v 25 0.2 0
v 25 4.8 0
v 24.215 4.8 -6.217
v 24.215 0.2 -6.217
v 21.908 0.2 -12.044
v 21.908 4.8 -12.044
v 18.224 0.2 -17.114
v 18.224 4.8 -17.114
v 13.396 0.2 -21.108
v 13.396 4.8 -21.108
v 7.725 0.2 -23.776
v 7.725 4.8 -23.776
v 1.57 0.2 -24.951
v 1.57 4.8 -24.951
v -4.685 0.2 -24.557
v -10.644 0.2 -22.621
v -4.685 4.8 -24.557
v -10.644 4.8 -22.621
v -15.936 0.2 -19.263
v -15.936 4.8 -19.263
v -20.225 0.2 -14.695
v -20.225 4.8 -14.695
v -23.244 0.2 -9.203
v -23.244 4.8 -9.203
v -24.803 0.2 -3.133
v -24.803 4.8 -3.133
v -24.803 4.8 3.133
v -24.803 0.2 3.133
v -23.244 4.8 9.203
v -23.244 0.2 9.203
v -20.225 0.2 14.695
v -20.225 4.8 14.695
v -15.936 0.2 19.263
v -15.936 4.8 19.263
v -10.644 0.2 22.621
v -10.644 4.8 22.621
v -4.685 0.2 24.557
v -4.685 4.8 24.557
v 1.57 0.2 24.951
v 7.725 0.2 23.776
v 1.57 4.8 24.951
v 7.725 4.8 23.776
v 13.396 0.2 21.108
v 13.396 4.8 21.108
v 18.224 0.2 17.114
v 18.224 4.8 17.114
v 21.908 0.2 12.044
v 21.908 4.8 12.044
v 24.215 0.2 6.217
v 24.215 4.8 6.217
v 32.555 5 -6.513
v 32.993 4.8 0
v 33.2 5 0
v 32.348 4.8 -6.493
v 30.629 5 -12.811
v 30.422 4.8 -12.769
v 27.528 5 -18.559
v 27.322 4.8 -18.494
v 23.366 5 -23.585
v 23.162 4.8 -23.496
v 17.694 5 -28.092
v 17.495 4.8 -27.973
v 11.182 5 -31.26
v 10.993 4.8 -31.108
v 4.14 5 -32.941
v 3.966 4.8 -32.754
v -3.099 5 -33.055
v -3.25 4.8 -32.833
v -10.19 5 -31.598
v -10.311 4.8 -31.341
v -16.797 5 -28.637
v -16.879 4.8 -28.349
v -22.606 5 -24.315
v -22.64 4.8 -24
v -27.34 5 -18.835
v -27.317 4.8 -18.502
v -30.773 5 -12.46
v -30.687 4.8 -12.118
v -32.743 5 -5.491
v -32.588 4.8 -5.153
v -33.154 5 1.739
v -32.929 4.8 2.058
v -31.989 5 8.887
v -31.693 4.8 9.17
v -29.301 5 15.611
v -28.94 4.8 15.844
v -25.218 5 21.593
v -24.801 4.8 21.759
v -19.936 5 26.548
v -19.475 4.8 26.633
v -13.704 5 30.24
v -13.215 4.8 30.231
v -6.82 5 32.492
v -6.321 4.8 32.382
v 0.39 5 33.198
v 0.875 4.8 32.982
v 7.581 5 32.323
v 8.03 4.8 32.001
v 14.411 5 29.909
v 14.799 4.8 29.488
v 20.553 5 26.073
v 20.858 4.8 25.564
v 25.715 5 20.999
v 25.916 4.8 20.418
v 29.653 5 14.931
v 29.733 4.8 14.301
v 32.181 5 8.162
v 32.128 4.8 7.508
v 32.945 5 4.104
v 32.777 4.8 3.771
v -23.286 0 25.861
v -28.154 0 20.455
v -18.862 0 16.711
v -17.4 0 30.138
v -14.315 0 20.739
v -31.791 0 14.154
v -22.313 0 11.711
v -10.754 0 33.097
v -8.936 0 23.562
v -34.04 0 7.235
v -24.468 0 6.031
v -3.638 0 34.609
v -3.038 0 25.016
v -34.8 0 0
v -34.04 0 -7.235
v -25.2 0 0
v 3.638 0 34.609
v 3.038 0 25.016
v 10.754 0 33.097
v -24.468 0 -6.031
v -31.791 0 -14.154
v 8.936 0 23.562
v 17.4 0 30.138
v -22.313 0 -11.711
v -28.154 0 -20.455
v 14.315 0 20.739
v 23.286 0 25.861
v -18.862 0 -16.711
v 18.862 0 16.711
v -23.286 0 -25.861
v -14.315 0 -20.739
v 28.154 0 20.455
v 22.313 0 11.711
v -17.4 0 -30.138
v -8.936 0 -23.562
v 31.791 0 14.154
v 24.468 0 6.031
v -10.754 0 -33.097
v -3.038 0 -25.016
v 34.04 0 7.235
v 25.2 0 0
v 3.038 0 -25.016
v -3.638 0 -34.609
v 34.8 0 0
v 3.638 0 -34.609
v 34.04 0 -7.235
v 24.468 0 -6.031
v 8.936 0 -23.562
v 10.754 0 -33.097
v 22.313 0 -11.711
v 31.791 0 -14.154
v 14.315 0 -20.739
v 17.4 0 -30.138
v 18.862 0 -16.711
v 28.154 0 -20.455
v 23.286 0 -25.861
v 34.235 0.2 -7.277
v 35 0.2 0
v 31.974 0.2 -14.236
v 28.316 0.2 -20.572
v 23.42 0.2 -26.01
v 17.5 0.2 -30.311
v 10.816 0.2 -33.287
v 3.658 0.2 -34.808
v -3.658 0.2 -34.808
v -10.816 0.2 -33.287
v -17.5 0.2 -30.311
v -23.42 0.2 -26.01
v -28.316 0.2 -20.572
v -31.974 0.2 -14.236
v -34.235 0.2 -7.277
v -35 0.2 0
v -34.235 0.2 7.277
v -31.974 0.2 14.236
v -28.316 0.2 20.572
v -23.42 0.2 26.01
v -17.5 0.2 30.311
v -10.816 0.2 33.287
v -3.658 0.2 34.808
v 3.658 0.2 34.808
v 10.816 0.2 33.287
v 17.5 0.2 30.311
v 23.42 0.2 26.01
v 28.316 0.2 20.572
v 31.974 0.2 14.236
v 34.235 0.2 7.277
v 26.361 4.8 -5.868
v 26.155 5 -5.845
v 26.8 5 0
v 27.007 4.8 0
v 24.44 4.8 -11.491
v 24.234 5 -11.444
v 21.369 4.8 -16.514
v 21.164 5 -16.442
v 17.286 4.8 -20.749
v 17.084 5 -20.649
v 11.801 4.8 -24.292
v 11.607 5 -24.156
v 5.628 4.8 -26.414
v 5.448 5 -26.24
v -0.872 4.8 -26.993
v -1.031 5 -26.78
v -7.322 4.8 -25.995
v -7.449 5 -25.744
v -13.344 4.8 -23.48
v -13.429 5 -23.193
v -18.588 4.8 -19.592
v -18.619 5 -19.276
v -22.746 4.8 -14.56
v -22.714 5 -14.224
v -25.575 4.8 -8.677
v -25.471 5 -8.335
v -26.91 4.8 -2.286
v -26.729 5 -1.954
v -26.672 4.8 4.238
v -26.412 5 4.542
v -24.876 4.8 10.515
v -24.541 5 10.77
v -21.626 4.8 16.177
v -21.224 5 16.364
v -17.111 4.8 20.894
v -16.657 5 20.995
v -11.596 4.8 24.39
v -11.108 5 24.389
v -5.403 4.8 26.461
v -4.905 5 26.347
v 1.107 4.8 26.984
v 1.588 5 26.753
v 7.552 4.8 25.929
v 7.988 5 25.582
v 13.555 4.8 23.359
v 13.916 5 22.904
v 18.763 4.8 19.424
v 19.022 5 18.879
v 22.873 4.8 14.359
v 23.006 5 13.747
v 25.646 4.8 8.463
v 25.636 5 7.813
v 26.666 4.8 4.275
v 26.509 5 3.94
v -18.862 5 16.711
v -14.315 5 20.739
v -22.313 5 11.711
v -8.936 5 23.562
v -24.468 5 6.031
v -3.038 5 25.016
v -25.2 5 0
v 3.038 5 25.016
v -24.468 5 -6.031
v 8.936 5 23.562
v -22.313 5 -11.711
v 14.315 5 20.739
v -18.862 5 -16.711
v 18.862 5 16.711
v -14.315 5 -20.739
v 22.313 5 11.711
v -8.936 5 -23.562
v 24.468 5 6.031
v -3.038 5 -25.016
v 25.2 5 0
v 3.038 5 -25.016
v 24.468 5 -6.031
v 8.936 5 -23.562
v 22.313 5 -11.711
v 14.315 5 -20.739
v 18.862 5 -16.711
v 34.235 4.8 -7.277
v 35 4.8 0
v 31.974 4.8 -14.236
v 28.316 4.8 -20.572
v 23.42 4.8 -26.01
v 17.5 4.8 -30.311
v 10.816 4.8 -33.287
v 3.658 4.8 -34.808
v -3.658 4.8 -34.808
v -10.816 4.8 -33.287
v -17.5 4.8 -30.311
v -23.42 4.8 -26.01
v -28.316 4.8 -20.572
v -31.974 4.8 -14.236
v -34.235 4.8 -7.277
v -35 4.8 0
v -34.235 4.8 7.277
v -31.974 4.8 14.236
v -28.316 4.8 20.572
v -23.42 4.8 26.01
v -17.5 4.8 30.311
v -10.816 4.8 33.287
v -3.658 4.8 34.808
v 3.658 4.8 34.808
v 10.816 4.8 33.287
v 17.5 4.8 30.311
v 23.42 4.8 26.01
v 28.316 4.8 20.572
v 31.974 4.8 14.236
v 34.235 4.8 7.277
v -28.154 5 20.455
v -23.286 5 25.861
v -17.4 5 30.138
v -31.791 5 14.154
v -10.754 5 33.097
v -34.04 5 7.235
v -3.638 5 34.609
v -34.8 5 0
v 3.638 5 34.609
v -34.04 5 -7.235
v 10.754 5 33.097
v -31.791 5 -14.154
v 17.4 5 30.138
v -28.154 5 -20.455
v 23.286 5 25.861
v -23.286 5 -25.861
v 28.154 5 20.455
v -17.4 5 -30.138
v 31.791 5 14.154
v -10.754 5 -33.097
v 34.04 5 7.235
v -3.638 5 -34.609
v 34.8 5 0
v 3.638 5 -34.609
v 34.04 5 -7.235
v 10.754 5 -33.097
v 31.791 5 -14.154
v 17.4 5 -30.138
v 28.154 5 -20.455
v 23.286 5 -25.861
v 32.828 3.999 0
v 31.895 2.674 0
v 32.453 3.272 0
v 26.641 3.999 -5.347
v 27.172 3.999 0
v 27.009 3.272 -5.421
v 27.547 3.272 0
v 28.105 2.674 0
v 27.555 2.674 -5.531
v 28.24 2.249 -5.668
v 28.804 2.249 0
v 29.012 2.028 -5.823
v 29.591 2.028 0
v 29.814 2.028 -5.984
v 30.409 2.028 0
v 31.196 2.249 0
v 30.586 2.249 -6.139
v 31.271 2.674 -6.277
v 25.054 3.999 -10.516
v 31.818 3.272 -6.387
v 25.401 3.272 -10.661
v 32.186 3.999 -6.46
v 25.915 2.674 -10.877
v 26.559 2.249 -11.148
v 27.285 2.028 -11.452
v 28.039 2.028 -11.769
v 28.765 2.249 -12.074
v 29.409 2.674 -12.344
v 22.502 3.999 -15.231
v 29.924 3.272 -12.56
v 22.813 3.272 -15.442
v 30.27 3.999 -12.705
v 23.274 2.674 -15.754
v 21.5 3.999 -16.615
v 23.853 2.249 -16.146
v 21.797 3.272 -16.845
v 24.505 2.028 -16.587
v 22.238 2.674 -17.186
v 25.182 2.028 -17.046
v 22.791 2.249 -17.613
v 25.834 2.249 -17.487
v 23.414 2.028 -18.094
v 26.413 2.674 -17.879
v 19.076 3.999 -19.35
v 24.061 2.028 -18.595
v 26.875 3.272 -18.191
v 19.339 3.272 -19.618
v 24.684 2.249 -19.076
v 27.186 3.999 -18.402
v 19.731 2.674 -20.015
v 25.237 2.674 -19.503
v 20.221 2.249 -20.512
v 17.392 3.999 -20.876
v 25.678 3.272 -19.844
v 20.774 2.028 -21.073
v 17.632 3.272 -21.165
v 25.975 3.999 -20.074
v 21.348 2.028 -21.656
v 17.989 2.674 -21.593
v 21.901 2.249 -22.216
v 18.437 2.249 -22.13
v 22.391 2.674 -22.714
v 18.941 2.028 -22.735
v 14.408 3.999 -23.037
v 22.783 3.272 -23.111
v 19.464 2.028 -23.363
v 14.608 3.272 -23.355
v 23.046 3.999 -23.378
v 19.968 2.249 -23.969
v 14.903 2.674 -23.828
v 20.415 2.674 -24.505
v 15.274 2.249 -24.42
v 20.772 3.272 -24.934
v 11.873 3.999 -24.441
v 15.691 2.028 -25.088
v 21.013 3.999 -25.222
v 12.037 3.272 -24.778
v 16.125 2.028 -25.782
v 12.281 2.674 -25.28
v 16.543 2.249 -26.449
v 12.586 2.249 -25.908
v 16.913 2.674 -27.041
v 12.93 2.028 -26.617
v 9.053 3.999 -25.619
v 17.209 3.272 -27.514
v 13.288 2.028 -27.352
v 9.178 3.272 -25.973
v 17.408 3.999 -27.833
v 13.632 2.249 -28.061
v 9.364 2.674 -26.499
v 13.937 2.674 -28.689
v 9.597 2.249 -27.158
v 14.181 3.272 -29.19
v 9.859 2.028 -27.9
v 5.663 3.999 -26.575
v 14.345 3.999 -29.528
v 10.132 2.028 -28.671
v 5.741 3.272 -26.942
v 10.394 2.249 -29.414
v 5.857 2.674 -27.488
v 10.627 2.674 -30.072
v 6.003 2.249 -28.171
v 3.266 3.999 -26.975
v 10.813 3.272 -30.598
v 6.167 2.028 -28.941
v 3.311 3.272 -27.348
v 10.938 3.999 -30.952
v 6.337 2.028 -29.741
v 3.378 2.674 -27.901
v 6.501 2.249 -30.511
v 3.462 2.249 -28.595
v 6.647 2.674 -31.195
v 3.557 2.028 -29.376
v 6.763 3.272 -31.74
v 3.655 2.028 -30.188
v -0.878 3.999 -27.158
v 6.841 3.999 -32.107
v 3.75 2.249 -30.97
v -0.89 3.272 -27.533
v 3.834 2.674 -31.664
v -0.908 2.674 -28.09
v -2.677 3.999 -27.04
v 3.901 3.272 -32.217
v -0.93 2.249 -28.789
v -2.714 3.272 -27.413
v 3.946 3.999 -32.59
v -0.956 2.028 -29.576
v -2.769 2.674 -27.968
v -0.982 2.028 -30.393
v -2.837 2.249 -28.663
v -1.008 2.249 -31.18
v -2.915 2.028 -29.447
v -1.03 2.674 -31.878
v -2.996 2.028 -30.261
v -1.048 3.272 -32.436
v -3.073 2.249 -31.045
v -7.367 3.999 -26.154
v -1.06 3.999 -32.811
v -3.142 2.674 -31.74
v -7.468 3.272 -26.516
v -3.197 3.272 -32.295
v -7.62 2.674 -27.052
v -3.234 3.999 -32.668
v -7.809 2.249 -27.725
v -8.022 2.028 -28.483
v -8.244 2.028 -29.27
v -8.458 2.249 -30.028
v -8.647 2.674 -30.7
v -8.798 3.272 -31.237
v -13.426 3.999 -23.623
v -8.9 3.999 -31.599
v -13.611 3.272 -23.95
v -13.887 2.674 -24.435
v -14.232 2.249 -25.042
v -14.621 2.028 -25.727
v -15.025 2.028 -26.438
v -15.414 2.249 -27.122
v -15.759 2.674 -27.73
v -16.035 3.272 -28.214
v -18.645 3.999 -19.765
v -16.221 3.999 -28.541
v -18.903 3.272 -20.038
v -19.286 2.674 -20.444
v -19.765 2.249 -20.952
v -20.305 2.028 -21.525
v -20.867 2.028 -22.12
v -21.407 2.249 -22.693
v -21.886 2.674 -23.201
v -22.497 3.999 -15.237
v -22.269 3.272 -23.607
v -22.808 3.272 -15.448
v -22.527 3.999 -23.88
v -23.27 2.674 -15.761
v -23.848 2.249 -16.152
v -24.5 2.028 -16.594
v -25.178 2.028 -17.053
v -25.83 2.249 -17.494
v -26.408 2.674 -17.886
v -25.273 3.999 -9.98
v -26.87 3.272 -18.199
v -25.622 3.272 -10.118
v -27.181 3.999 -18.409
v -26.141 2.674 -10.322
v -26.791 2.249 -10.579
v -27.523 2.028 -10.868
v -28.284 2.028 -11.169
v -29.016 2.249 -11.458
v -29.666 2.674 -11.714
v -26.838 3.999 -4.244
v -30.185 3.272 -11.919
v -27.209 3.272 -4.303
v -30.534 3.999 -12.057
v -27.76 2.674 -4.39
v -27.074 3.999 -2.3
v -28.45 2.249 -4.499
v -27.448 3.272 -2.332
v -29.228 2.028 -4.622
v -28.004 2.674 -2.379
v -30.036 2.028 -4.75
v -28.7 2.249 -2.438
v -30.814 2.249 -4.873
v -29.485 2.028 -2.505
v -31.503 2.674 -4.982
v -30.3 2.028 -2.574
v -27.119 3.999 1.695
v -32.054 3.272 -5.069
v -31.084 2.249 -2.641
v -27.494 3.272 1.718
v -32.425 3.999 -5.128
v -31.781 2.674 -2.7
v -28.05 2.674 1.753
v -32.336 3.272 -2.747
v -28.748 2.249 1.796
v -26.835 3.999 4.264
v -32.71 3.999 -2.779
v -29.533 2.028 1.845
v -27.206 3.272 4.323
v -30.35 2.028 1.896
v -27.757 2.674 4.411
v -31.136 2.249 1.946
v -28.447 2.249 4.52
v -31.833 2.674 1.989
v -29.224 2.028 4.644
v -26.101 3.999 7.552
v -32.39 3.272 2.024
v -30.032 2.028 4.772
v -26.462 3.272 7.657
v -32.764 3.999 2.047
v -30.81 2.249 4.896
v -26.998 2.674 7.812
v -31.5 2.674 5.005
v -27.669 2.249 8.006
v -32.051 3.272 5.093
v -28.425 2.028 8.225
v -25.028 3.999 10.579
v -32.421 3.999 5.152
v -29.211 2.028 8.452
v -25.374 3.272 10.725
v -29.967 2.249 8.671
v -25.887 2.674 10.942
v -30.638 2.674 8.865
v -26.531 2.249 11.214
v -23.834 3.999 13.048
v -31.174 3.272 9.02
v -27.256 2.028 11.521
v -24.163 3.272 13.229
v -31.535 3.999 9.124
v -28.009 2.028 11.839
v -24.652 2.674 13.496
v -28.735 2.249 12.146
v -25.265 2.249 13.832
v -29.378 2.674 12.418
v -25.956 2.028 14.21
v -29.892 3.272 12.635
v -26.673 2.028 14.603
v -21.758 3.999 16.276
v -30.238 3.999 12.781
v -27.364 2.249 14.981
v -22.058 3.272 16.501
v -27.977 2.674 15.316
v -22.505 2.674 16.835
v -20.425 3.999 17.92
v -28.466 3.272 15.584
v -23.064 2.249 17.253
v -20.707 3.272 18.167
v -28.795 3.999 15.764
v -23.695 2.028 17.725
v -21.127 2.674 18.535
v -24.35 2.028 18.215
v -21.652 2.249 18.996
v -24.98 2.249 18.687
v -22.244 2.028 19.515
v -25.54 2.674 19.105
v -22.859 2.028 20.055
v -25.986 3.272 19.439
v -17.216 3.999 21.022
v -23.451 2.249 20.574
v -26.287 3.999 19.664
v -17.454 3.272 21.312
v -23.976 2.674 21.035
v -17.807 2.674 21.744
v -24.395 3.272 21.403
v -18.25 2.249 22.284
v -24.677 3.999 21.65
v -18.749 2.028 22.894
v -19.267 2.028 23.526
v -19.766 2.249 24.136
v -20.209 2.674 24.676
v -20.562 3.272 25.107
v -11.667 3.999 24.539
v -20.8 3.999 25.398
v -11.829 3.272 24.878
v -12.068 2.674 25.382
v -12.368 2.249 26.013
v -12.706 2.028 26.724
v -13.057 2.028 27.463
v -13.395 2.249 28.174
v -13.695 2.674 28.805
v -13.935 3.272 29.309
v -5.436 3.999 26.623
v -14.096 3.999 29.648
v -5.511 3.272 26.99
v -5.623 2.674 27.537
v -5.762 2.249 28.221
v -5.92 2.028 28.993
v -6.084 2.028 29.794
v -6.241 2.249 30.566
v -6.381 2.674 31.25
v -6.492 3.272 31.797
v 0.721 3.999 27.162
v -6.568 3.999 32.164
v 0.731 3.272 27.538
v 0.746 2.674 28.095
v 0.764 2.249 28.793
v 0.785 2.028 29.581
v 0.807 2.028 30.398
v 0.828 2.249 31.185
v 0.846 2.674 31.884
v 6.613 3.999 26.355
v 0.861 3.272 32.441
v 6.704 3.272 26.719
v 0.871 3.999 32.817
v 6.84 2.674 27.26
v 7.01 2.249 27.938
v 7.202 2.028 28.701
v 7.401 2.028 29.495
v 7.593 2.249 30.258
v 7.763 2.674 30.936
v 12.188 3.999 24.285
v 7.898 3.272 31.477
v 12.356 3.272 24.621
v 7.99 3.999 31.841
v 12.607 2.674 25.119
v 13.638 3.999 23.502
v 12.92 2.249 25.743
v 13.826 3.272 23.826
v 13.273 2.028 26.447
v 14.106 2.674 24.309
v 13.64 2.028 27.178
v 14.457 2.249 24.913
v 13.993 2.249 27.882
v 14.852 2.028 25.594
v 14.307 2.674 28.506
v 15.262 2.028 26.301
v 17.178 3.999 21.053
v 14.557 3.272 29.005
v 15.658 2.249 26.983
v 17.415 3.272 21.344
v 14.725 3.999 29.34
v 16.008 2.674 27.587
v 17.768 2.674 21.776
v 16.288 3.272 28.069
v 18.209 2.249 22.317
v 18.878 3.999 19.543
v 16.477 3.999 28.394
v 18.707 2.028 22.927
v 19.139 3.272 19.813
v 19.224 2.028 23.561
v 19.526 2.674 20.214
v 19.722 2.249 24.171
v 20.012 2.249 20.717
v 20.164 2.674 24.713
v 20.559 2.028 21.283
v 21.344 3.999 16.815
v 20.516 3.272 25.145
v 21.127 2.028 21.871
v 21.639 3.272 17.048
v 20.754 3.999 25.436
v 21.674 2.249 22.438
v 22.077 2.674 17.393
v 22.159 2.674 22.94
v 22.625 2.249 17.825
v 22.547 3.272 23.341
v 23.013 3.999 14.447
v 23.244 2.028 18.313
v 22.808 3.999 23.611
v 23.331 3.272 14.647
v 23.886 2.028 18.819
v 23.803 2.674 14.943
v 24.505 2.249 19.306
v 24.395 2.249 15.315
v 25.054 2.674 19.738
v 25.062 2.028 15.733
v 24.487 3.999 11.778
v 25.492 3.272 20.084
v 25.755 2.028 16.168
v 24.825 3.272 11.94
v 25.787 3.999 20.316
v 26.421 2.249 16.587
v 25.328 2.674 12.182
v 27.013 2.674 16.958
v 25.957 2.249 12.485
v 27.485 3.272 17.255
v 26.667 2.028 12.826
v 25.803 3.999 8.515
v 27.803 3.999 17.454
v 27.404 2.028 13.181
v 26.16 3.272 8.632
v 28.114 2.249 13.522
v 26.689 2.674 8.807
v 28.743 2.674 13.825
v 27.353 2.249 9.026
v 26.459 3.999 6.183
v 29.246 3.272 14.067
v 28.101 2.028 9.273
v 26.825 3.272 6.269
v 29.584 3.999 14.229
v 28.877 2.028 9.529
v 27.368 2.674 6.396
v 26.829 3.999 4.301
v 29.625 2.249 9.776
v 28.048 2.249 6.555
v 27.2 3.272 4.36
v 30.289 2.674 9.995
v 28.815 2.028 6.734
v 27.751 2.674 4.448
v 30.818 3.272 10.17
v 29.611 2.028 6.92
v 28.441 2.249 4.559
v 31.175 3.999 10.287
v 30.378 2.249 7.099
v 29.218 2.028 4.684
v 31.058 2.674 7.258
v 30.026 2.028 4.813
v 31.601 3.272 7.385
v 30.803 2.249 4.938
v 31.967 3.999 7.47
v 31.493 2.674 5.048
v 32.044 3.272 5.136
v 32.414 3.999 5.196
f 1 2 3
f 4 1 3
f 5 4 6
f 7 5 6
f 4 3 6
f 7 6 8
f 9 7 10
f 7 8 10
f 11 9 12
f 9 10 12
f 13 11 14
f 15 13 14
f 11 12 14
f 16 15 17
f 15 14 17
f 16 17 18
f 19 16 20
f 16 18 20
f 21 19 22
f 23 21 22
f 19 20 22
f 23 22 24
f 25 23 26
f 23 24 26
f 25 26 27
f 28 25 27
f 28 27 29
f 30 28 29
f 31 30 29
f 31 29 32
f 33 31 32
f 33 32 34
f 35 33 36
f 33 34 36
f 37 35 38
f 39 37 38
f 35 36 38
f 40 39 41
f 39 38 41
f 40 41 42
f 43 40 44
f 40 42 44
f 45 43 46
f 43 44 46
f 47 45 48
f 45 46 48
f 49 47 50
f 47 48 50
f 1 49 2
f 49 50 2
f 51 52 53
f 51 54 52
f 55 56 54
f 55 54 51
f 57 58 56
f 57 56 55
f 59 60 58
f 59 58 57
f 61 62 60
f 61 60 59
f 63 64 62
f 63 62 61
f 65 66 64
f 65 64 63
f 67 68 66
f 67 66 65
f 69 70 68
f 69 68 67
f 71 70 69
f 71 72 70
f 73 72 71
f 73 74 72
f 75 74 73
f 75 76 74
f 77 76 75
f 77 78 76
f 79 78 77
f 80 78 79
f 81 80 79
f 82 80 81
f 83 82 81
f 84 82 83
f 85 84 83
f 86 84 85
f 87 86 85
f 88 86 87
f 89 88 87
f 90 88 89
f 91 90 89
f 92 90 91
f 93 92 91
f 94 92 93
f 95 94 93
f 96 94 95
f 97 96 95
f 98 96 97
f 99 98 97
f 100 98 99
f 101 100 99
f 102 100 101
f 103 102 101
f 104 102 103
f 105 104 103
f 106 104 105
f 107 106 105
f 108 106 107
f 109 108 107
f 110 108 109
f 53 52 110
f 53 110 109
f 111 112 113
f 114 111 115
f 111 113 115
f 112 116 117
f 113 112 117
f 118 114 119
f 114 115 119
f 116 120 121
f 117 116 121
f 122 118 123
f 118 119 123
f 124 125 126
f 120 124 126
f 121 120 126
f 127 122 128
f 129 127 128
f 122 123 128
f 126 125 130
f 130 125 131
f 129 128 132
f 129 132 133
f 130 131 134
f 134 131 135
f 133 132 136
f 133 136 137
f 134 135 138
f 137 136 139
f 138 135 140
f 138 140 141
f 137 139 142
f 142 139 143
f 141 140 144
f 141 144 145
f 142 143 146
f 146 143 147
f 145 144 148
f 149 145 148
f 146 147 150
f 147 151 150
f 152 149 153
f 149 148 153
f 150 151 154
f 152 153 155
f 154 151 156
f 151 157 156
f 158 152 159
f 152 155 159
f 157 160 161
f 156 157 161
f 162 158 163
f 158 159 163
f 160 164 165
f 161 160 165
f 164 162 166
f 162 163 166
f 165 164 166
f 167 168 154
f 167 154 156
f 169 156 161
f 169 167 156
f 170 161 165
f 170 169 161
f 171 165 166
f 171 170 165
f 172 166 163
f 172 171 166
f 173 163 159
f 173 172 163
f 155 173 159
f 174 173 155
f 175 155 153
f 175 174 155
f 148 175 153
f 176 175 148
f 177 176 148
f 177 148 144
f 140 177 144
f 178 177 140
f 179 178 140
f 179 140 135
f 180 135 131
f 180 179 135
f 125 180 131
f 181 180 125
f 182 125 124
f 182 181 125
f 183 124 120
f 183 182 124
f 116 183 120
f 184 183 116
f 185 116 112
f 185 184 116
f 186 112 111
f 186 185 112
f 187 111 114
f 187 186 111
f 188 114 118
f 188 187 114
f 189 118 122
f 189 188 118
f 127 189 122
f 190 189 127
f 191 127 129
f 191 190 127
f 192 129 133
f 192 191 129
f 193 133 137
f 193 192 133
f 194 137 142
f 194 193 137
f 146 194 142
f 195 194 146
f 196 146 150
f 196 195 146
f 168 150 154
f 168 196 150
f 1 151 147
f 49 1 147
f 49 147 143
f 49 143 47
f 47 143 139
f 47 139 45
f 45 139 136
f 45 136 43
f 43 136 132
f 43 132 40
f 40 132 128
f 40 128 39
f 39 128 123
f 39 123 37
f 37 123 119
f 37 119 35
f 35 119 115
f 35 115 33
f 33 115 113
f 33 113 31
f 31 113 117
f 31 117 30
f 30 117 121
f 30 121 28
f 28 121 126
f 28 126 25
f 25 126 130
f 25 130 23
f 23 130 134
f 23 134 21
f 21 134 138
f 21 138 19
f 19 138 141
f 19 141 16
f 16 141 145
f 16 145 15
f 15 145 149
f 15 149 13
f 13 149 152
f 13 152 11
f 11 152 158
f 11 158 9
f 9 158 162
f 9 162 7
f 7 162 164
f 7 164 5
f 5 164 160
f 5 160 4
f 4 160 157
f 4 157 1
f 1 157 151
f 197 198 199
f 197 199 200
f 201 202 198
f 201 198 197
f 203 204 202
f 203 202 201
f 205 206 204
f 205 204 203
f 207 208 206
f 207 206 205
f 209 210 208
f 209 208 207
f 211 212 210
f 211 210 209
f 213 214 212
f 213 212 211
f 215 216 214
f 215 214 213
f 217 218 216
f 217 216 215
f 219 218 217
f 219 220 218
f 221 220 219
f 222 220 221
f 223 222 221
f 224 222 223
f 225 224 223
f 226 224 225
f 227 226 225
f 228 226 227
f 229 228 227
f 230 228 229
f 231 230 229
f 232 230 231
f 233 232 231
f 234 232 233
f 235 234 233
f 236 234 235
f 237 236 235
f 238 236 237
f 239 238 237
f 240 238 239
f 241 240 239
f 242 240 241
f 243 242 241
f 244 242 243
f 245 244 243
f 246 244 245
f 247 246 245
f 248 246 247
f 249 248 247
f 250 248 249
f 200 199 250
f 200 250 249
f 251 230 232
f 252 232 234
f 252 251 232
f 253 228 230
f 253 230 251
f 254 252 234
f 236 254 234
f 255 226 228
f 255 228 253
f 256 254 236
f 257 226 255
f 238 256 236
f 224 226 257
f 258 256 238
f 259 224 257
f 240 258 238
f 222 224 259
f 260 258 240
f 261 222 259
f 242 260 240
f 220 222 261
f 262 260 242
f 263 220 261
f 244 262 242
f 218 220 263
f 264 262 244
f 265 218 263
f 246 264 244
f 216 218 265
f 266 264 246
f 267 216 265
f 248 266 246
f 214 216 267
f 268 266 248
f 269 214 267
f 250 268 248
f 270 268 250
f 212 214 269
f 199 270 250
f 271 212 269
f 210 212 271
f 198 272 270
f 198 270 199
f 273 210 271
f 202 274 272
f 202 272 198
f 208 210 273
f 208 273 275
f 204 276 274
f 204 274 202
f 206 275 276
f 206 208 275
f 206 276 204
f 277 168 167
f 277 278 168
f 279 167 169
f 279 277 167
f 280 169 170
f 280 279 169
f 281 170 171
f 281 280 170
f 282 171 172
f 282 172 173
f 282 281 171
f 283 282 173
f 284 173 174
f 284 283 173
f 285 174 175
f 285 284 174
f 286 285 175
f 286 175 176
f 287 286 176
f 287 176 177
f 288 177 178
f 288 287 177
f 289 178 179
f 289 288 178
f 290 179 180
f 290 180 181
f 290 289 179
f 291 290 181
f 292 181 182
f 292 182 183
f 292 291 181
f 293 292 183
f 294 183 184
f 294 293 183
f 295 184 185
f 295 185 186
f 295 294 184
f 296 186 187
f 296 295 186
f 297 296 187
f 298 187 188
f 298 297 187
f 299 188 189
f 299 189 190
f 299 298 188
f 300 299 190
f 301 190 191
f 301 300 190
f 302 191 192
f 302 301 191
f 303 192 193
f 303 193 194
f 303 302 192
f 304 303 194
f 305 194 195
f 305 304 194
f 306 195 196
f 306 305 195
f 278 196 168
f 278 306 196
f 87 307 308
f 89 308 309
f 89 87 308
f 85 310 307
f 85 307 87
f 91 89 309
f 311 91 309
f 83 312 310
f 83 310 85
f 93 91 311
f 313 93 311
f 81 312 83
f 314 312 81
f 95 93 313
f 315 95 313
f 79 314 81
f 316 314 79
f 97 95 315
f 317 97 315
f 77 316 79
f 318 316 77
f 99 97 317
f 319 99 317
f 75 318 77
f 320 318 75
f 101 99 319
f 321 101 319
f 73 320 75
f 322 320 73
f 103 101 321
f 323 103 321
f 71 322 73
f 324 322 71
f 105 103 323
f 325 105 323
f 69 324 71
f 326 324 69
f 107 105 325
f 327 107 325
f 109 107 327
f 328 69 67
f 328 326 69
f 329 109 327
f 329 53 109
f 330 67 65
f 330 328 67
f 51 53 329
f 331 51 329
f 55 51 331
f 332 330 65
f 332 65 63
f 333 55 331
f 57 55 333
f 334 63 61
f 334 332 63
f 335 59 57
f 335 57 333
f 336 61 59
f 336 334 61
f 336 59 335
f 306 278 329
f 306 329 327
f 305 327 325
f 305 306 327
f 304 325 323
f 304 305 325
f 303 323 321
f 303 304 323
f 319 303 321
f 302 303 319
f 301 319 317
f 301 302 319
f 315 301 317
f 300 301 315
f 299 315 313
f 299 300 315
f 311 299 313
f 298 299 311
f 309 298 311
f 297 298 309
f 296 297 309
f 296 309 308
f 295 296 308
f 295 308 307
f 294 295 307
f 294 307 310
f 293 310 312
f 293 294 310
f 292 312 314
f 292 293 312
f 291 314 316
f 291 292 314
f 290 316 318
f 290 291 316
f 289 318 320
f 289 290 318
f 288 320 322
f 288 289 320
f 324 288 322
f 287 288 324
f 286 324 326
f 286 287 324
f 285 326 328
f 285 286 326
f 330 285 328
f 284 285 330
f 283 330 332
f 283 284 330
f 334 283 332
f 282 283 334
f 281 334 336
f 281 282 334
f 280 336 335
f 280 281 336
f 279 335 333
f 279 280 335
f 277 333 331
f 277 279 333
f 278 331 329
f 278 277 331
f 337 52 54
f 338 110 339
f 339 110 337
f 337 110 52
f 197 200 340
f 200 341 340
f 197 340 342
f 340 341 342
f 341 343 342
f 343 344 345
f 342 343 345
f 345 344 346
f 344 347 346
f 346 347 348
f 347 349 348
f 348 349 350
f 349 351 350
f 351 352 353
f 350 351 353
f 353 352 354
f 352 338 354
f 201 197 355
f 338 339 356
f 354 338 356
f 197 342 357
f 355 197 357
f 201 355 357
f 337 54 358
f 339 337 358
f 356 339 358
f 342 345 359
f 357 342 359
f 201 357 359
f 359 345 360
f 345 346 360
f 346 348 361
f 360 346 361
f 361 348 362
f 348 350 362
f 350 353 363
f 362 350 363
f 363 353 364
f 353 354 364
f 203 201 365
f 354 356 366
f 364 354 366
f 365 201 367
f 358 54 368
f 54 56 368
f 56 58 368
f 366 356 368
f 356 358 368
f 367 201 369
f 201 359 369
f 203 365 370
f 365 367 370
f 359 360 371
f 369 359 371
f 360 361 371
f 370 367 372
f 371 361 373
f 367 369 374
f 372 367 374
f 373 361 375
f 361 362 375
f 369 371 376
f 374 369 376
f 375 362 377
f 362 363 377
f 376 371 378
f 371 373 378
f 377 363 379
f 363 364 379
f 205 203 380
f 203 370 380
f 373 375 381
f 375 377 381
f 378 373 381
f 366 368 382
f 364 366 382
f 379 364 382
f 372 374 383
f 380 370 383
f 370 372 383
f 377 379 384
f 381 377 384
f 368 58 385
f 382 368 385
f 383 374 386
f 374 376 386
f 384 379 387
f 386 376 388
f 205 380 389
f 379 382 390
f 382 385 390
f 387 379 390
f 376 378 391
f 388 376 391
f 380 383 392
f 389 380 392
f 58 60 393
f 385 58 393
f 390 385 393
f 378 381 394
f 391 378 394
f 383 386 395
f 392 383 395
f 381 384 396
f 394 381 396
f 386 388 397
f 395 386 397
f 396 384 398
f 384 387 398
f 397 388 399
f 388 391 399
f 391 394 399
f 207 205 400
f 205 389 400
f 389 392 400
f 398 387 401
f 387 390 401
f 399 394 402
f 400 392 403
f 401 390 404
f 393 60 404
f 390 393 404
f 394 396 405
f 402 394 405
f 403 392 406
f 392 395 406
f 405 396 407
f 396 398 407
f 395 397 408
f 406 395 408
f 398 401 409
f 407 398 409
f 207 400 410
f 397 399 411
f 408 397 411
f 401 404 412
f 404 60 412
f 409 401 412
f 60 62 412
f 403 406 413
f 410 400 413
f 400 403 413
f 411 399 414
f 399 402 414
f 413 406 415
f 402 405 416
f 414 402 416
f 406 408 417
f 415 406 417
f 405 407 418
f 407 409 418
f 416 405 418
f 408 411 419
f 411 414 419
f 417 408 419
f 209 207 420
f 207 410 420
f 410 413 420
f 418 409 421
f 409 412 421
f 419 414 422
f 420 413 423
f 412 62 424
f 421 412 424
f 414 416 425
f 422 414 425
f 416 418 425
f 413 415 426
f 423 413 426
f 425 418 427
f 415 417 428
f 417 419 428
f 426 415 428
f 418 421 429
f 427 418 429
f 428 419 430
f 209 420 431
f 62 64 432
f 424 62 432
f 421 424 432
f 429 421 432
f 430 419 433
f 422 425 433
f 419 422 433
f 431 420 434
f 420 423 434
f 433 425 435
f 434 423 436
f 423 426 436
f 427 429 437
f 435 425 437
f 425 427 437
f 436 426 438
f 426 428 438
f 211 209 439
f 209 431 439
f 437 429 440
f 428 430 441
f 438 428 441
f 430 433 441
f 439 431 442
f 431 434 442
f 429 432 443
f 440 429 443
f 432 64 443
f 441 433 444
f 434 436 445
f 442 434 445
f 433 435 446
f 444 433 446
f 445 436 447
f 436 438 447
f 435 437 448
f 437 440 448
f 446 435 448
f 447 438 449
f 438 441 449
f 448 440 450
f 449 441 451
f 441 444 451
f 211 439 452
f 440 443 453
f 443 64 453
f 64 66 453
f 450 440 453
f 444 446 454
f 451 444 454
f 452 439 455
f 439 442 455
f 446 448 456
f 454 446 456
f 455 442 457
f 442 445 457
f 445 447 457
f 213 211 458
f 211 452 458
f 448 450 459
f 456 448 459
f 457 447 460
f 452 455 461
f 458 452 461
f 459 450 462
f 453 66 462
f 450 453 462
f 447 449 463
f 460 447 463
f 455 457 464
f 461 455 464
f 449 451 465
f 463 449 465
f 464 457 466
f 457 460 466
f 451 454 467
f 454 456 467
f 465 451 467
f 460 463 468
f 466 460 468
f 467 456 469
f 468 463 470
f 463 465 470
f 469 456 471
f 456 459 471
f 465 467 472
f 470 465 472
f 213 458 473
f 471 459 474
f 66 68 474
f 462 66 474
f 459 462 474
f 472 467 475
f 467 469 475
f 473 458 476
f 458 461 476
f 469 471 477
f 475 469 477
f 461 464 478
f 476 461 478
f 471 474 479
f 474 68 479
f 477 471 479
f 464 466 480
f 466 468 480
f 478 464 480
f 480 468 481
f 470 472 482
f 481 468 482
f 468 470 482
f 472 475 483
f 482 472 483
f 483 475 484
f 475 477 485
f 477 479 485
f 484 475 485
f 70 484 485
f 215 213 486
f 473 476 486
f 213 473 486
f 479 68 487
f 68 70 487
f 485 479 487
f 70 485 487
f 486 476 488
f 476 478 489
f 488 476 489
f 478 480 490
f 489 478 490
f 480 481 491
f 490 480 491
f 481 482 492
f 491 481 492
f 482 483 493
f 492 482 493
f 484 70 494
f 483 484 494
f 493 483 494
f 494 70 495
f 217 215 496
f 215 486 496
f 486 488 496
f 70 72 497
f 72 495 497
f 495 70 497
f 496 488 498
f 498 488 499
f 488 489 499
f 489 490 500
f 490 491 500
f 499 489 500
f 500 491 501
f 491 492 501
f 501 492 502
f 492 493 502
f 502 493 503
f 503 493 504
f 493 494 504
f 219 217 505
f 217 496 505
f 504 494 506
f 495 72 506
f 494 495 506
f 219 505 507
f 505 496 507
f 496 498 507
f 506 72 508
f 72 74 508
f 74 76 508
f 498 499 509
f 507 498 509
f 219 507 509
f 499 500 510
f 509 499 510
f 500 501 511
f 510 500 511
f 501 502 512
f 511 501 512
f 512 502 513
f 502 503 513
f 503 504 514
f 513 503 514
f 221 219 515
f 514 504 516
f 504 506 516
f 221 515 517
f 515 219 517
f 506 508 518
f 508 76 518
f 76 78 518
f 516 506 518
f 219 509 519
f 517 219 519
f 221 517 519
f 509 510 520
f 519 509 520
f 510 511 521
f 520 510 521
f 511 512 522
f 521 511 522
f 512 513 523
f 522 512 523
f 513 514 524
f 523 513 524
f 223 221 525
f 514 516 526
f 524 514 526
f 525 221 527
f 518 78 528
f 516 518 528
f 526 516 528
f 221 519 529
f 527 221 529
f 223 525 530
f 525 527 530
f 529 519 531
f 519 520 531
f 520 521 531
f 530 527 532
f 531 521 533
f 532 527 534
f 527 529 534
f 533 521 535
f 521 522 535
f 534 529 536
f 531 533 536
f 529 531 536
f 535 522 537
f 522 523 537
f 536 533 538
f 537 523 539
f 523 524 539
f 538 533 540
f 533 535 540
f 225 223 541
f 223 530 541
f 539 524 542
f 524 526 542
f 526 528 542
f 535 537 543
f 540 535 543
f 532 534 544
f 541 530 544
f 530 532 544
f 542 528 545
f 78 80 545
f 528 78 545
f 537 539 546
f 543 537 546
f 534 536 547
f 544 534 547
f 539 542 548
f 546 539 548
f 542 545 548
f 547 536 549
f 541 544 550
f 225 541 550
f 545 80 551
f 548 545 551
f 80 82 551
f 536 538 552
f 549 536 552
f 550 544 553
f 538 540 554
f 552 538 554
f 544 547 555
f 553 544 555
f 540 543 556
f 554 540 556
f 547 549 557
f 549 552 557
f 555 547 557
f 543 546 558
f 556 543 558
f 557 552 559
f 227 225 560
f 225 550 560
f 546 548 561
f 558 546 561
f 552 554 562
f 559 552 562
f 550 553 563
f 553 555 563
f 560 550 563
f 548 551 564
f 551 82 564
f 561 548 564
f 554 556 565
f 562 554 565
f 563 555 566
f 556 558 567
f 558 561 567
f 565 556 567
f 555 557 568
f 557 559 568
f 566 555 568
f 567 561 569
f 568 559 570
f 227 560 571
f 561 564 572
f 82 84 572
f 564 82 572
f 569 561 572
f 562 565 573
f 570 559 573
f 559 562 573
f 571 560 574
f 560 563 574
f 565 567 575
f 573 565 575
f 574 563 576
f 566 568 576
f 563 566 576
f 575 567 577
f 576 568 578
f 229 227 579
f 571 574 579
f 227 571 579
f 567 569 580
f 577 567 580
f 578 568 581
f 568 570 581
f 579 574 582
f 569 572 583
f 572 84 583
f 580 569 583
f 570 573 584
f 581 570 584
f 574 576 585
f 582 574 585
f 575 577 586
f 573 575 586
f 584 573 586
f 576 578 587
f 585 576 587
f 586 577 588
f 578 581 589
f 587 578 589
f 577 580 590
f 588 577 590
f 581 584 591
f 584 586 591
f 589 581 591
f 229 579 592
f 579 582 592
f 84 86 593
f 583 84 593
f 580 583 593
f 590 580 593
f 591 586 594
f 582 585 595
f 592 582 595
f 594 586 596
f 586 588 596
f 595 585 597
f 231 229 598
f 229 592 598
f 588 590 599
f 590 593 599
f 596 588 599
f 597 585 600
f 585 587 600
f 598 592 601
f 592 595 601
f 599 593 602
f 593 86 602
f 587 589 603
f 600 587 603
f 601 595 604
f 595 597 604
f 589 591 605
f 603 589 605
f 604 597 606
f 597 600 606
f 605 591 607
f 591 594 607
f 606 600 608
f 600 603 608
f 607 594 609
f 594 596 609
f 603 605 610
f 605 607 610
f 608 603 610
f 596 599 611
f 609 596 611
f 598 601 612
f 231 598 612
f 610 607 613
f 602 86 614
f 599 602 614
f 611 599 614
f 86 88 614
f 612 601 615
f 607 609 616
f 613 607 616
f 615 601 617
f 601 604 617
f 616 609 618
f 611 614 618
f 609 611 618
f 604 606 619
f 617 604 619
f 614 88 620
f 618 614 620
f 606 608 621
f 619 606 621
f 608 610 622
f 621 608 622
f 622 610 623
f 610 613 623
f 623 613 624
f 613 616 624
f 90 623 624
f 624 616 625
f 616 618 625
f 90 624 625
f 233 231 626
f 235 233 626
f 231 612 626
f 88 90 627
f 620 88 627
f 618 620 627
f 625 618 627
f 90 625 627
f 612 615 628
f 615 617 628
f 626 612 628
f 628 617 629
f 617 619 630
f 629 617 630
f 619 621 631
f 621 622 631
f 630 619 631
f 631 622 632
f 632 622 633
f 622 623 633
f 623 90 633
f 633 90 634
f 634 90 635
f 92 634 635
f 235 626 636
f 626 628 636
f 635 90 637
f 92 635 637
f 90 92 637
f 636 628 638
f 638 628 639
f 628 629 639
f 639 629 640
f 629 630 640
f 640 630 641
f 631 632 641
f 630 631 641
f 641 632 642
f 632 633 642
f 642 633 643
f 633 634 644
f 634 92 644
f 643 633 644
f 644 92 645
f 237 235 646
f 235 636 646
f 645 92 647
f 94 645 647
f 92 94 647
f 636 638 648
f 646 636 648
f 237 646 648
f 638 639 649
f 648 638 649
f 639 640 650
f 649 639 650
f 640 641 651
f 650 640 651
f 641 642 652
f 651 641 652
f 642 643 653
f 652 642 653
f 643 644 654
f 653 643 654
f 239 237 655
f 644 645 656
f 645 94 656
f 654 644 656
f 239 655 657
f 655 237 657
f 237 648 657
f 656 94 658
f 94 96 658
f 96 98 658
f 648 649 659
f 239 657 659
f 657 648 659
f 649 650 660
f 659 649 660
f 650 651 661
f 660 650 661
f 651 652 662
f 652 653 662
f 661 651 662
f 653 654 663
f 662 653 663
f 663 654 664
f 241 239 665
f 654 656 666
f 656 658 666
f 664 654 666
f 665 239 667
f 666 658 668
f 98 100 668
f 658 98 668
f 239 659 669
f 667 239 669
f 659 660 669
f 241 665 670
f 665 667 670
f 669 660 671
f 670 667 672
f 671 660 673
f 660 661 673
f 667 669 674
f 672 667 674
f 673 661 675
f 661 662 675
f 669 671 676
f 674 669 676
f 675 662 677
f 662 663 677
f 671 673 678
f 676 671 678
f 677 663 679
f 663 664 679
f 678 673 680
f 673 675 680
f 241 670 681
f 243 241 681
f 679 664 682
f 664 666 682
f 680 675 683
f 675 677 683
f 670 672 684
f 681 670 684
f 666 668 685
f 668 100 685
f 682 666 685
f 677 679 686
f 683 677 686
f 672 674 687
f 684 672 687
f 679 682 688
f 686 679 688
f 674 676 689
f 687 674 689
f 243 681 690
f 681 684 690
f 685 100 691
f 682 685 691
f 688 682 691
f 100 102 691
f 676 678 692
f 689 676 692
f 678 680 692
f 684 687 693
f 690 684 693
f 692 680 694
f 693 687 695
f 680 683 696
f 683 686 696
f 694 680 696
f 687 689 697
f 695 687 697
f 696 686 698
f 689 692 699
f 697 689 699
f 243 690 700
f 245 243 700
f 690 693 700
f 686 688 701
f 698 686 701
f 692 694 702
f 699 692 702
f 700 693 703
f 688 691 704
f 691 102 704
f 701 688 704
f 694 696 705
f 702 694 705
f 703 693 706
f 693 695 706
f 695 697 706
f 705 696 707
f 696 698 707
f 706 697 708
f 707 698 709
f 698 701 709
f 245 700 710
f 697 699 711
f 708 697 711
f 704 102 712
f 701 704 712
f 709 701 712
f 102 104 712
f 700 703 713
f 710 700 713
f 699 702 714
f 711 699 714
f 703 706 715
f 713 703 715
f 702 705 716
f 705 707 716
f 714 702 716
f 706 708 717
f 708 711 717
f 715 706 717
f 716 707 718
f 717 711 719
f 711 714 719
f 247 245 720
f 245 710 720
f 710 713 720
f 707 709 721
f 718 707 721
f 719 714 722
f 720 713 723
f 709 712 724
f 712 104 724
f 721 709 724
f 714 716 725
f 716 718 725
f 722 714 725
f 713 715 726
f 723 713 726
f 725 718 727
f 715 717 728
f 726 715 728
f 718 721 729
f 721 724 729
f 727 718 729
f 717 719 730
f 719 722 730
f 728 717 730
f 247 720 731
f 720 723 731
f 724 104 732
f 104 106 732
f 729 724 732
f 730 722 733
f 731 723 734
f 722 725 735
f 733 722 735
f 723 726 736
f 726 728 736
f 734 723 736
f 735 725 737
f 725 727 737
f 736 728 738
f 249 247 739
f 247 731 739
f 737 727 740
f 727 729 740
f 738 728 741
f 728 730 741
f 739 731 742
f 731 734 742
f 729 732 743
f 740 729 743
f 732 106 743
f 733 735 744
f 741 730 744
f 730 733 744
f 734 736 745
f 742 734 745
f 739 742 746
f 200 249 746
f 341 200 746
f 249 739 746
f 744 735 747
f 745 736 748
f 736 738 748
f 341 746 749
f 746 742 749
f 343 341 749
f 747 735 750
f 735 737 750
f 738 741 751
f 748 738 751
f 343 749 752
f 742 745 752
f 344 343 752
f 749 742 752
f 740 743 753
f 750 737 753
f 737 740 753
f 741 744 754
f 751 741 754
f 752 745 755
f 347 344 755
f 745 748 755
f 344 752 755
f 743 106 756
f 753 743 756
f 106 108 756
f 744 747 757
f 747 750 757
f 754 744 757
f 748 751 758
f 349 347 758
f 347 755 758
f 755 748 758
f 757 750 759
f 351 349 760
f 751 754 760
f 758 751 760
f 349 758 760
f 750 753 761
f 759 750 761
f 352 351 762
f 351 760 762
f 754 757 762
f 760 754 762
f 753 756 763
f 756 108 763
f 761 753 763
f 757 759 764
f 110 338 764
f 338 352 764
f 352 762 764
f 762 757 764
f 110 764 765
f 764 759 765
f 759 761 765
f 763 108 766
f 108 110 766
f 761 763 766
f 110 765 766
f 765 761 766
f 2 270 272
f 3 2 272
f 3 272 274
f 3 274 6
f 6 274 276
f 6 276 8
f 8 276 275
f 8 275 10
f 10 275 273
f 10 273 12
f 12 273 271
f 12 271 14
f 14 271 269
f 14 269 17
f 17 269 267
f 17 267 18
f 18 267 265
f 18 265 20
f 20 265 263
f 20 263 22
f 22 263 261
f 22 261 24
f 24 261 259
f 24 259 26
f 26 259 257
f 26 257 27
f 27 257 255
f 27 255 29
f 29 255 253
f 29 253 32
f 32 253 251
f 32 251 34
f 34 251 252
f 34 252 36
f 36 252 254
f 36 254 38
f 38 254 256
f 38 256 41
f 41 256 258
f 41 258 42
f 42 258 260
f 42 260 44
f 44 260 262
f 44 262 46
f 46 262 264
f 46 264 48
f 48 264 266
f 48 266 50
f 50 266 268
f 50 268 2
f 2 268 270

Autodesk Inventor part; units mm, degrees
ref_plane "YZ Plane" through (0, 0, 0) normal (1, 0, 0) x (0, 1, 0)
ref_plane "XZ Plane" through (0, 0, 0) normal (0, 1, 0) x (-1, 0, 0)
ref_plane "XY Plane" through (0, 0, 0) normal (0, 0, 1) x (1, 0, 0)
sketch "Sketch1" plane through (0, 0, 0) normal (0, 0, 1) x (1, 0, 0)
  line L0 (25, 0) -> (35, 0)
  line L1 (35, 0) -> (35, 5)
  line L2 (25, 0) -> (25, 5)
  arc A0 (27, 5) -> (33, 5) centre (30, 5) ccw
  line L3 (35, 5) -> (33, 5)
  line L4 (25, 5) -> (27, 5)
  line L5 (0, -1) -> (0, 6) projected
  point P0 (0, 0)
  point P1 (30, 0)
  dimension "d0" = 25
  dimension "d1" = 10
  dimension "d2" = 5
  dimension "d3" = 6
revolve "Revolution1" add sketch "Sketch1" angle 360 about axis through (0, -10, 0) along (0, 1, 0)
chamfer "Chamfer1" distance 0.2 angle 45 6 edges at (-25, 0, 0) (-35, 0, 0) (-35, 5, 0) (-33, 5, 0) (-27, 5, 0) (-25, 5, 0)
properties part number "UBC Bearing 51110 - buitenkant" material "Stainless Steel"
